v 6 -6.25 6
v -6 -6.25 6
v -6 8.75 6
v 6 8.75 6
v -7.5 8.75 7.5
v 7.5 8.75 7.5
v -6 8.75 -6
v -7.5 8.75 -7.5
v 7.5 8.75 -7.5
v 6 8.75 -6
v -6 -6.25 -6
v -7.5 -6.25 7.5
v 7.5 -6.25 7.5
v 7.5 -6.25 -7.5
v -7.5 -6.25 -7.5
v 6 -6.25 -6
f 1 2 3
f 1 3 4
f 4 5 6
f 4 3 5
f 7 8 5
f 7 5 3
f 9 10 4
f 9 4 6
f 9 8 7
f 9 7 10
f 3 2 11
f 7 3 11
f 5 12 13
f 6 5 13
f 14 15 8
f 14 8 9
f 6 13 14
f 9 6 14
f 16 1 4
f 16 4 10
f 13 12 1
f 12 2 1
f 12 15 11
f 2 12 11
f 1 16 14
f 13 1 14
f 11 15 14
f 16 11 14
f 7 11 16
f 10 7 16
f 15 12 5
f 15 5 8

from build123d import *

# Parameters (mm, degrees)
SKETCH1_W           = 2.5
SKETCH1_H           = 2.5
SKETCH1_W_2         = 2
SKETCH1_H_2         = 2
BOSS_EXTRUDE1_DEPTH = 2.5
SCALE1_SCALE        = 6


with BuildPart() as part:
    # Sketch1 → Boss-Extrude1 (new body)
    with BuildSketch(Plane(origin=(0, 0, 0), x_dir=(1, 0, 0), z_dir=(0, 1, 0))):
        Rectangle(SKETCH1_W, SKETCH1_H)
        Rectangle(SKETCH1_W_2, SKETCH1_H_2, mode=Mode.SUBTRACT)
    extrude(amount=BOSS_EXTRUDE1_DEPTH)


with BuildPart() as part_1:
    # Scale1: scaled about (0, 1.25, 0)
    add(part.part.scale(SCALE1_SCALE).moved(Location((0, -6.25, 0))))


solid = part_1.part
